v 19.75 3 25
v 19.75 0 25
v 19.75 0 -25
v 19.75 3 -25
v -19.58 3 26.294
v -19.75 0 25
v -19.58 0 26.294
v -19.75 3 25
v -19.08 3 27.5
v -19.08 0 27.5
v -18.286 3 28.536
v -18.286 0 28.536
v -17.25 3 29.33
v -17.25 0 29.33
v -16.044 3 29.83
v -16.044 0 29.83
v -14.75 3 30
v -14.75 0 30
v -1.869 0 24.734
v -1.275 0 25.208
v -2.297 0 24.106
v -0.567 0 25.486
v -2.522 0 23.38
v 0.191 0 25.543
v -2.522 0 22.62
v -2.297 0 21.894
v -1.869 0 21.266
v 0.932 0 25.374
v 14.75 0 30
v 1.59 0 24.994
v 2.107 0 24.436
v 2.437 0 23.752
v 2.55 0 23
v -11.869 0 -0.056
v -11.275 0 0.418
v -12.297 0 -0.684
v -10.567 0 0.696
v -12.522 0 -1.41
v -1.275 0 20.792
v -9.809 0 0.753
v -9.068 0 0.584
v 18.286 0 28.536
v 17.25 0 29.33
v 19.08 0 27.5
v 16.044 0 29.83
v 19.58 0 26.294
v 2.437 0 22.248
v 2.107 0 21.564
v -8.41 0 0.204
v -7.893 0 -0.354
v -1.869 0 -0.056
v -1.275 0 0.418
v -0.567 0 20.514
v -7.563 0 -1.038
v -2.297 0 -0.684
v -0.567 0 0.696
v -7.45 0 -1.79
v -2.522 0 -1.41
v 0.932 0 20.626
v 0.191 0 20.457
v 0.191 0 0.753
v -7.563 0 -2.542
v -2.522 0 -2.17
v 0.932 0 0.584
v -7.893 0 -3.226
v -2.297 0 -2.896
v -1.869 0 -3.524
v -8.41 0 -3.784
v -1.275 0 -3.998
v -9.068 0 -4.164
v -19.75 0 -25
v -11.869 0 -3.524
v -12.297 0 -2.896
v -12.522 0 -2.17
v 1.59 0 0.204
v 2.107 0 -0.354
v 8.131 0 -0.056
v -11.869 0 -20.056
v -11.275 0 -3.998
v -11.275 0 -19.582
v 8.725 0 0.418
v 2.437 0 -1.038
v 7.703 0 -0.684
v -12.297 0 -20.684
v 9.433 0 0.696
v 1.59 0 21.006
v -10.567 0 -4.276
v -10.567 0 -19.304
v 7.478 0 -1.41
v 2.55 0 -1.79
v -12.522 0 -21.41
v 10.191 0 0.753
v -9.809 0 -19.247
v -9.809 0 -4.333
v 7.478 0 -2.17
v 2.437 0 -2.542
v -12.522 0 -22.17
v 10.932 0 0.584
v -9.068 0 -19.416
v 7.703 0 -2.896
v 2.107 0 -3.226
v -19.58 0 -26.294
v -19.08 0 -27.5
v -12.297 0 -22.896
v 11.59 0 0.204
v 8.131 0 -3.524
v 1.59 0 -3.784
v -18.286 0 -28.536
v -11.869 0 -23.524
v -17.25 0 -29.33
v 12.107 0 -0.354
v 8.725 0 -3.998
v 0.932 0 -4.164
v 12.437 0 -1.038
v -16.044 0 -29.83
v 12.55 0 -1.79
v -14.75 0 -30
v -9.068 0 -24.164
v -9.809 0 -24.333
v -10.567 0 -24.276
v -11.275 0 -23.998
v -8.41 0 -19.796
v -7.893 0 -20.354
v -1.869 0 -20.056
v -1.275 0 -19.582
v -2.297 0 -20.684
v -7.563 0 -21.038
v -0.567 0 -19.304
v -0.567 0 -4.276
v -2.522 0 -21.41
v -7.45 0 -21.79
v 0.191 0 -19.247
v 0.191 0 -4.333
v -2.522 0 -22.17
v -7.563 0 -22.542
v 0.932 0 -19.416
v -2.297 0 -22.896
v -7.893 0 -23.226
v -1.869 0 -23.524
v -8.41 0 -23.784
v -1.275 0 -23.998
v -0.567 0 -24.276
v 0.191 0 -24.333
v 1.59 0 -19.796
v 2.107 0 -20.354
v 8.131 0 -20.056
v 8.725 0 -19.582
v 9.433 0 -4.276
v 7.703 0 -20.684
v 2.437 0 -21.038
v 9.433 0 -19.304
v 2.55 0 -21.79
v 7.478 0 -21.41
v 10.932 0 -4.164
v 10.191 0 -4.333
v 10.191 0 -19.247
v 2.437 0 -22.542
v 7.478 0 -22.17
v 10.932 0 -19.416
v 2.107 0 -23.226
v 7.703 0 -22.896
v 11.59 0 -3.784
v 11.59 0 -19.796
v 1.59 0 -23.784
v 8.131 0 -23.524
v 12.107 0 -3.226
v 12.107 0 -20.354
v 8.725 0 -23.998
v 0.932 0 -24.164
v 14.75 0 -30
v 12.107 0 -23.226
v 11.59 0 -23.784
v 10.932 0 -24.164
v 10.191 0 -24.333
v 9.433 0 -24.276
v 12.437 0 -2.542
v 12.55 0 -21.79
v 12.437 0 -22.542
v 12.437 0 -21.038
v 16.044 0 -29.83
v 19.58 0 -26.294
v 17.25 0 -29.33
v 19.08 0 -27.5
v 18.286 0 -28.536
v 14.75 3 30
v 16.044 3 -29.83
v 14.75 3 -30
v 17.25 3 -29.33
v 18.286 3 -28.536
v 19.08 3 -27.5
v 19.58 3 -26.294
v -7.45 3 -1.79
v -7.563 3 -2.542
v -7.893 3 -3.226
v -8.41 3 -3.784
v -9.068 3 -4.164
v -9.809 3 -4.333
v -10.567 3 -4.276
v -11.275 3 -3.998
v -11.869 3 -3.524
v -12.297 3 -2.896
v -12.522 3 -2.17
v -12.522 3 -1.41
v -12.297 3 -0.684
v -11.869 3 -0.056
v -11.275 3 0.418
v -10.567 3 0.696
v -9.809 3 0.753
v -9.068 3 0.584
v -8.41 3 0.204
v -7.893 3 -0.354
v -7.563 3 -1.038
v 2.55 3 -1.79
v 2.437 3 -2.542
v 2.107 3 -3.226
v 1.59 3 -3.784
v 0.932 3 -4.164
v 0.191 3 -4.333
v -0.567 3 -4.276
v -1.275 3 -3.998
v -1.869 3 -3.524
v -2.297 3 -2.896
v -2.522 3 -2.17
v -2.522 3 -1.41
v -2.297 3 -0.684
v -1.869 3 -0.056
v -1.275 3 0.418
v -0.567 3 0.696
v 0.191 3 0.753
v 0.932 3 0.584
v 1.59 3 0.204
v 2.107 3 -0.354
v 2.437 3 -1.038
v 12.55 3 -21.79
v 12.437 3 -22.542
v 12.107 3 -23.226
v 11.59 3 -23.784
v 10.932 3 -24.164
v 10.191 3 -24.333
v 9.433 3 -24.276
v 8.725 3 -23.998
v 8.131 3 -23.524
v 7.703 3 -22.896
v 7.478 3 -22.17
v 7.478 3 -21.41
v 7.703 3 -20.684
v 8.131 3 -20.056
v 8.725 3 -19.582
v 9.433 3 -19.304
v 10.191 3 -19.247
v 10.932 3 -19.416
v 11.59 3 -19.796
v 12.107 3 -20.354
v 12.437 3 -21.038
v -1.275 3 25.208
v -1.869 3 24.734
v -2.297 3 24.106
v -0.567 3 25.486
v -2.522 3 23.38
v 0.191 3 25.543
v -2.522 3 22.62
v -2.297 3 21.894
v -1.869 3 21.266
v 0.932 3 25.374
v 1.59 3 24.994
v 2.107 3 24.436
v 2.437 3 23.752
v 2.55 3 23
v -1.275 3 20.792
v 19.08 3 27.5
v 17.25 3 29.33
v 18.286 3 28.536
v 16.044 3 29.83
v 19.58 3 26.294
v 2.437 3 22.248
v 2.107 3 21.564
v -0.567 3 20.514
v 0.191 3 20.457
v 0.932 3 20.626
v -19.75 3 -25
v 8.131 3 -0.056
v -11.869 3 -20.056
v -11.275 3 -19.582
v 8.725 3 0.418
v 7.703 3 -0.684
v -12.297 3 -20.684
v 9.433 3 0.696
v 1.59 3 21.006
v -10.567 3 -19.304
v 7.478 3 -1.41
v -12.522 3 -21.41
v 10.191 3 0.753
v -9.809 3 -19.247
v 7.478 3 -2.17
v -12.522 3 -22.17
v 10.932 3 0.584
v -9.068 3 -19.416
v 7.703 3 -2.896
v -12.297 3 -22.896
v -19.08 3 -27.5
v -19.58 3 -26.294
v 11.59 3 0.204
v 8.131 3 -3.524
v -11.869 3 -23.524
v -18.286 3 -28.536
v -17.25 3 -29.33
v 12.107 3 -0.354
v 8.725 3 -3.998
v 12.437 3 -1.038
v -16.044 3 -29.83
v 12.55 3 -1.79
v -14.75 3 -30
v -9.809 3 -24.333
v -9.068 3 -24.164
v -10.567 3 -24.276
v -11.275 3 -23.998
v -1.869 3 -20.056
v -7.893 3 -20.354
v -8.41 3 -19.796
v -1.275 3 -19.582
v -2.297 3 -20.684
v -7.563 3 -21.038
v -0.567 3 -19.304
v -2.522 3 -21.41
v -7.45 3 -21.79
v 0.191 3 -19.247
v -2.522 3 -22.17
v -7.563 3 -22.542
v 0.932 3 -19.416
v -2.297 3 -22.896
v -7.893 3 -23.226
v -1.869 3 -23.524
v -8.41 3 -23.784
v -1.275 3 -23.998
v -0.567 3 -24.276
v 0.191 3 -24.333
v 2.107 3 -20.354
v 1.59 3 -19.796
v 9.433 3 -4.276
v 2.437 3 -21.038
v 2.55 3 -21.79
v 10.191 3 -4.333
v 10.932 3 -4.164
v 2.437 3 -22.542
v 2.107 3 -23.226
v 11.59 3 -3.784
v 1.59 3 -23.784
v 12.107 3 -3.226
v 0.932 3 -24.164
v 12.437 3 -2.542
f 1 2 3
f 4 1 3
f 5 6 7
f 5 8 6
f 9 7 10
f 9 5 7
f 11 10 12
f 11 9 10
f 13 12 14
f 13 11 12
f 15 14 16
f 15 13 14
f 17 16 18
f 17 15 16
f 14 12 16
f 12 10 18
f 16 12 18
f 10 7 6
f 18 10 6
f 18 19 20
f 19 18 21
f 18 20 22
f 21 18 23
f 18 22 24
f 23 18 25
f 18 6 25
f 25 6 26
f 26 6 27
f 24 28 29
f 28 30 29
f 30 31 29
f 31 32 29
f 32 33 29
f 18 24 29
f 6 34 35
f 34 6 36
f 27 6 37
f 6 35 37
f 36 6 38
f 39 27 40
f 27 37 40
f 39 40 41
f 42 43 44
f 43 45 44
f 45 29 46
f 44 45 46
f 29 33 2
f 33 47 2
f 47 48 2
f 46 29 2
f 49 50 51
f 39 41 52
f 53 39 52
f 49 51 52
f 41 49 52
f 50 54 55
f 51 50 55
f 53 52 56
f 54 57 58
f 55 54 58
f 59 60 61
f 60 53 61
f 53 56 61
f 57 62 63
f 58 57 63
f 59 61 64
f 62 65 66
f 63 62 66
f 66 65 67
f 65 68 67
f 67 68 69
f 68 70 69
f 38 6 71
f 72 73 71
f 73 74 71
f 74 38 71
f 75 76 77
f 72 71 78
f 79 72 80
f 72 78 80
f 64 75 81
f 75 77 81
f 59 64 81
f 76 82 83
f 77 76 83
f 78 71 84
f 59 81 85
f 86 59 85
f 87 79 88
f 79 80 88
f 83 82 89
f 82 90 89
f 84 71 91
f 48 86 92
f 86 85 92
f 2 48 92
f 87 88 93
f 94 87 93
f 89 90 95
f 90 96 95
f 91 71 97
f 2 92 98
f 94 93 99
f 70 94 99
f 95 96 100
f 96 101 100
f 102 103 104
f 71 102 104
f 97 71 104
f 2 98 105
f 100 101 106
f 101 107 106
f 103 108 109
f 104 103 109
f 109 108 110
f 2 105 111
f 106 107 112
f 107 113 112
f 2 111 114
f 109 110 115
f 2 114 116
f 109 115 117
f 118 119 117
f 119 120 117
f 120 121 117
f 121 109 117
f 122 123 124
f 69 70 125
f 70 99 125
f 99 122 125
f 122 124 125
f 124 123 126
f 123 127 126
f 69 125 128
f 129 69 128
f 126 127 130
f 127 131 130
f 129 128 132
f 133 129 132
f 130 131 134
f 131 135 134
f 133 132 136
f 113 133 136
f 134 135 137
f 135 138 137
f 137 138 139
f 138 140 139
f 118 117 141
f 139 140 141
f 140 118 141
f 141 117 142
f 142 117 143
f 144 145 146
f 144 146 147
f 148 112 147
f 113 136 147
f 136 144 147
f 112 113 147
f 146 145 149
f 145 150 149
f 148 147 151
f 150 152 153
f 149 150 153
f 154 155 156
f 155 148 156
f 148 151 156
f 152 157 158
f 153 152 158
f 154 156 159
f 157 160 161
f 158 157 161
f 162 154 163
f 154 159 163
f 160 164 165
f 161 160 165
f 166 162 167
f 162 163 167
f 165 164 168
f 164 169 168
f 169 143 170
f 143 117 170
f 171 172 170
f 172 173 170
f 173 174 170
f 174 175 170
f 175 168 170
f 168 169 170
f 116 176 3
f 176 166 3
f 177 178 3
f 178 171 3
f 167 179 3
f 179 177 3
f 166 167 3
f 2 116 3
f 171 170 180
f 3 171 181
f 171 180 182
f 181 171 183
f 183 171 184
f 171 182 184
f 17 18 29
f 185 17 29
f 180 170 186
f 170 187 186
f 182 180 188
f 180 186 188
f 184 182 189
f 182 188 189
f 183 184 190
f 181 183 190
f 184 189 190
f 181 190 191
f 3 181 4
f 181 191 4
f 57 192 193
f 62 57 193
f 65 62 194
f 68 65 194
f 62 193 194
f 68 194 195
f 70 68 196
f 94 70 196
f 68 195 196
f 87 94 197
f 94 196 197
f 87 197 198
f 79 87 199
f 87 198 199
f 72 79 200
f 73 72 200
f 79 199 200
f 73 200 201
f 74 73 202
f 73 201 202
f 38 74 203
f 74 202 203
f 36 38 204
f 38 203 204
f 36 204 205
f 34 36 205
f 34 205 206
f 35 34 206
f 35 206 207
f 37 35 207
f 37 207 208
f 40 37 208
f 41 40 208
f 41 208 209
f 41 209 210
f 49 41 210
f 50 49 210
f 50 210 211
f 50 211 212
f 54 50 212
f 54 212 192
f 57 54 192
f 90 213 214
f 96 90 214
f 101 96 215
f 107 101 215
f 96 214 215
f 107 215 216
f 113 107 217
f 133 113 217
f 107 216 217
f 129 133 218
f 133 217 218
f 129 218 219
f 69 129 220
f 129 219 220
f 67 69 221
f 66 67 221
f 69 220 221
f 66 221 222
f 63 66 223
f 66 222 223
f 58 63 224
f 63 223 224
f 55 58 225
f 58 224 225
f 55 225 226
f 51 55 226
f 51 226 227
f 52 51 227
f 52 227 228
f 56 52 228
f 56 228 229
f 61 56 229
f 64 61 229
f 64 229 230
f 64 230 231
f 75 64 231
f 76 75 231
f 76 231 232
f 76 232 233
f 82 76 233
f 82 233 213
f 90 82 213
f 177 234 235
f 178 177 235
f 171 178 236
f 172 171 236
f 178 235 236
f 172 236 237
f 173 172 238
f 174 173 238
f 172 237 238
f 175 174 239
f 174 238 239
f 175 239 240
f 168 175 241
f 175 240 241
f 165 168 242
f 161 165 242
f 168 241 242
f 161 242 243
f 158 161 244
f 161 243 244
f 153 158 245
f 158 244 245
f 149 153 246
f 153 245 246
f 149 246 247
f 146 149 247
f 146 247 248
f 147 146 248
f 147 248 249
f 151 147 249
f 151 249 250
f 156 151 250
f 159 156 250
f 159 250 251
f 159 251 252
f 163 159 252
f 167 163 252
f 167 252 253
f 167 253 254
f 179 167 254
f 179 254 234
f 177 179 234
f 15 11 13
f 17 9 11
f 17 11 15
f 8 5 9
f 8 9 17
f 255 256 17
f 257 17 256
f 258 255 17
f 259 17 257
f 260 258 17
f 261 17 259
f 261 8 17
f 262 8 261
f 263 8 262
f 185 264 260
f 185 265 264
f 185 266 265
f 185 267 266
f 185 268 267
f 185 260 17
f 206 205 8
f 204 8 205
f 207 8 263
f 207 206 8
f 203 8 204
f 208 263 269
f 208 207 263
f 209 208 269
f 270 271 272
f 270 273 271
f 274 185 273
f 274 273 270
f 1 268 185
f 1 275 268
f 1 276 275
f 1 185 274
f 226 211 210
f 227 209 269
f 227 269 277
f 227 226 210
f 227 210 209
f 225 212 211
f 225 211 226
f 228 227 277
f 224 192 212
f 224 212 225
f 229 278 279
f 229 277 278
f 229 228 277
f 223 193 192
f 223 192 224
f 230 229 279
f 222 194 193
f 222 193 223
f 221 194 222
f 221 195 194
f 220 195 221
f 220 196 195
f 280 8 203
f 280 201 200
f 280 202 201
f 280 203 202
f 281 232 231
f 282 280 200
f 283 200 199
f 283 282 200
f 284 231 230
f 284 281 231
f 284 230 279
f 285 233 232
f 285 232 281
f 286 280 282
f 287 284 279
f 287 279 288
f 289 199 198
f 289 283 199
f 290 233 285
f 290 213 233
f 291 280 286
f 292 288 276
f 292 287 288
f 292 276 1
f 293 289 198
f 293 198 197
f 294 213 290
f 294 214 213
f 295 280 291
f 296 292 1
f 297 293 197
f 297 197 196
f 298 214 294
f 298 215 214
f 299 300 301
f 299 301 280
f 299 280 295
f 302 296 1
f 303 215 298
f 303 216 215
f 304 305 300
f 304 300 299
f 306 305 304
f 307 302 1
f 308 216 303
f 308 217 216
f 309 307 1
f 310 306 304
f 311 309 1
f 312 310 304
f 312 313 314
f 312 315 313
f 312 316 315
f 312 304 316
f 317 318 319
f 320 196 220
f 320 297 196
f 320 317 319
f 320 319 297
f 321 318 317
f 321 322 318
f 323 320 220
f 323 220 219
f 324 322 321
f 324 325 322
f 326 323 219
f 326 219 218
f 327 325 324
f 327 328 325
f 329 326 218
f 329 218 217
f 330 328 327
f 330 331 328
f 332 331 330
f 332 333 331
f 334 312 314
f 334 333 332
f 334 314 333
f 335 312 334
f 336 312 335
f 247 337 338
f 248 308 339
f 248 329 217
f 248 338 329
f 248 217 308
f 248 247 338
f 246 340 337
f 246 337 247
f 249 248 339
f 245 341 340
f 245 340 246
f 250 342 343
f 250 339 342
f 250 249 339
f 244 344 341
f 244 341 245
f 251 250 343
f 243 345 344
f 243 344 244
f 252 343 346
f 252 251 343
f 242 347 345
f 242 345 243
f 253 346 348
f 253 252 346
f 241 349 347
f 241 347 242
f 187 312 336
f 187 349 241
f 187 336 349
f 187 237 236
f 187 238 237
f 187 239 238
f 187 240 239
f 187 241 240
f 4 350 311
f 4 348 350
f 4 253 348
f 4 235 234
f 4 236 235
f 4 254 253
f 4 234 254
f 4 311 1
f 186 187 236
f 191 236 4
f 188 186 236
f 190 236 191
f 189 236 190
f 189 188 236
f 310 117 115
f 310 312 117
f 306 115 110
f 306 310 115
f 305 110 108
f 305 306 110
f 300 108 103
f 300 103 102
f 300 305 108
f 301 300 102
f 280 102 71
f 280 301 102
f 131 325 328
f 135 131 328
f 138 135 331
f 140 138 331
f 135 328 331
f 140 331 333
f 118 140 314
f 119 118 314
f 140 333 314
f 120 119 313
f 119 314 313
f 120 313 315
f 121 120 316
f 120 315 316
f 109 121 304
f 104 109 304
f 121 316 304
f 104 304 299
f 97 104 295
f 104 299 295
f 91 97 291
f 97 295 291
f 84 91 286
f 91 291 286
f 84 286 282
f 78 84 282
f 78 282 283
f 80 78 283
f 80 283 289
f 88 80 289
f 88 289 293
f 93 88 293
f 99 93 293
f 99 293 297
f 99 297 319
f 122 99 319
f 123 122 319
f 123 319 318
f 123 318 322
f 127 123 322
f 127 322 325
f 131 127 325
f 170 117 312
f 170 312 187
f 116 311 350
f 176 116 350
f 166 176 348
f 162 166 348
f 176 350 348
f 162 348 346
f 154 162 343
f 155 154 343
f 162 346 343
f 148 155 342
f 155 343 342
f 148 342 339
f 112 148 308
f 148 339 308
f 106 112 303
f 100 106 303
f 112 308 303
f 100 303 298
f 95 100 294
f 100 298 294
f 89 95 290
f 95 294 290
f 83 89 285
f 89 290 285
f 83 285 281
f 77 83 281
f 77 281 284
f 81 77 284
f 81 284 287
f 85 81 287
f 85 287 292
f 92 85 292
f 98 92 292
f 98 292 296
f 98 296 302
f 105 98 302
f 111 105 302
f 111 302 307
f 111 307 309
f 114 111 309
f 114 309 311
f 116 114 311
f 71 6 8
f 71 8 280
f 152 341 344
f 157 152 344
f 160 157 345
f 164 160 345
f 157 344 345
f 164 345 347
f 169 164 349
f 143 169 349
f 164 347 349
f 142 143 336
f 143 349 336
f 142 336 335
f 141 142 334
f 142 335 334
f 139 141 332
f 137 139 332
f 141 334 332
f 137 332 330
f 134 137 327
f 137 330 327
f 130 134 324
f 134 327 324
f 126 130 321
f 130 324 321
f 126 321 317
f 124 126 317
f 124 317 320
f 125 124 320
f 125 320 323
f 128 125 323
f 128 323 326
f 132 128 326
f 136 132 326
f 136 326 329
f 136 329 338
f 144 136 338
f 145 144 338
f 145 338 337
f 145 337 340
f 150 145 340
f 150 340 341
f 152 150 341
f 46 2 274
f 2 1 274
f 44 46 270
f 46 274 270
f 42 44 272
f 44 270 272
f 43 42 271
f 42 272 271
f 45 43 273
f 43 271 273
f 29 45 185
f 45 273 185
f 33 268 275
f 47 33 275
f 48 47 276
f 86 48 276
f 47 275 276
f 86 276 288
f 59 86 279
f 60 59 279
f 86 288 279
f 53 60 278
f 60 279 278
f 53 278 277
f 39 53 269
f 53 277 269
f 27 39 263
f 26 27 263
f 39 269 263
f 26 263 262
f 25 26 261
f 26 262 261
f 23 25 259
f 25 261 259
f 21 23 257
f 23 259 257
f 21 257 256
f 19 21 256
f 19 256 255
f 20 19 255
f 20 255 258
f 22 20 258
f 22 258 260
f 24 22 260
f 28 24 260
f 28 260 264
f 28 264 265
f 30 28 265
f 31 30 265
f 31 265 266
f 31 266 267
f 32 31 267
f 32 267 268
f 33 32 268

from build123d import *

# Parameters (mm, degrees)
SKETCH1_W                 = 39.5
SKETCH1_H                 = 60
BOSS_EXTRUDE1_DEPTH       = 3
SKETCH2_R                 = 2.55
CUT_EXTRUDE1_DEPTH        = 4
SKETCH4_R                 = 2.55
CUT_EXTRUDE2_DEPTH        = 4
LPATTERN1_COUNT           = 2
LPATTERN1_PITCH           = 10
LPATTERN1_COL_COUNT       = 2
LPATTERN1_COL_PITCH       = 10
LPATTERN2_COUNT           = 2
LPATTERN2_PITCH           = 20
LPATTERN2_COPY_1_SKETCH_R = 2.55
LPATTERN2_COPY_1_DEPTH    = 4
LPATTERN2_COPY_2_SKETCH_R = 2.55
LPATTERN2_COPY_2_DEPTH    = 4
FILLET1_R                 = 5
FILLET2_R                 = 5
FILLET3_R                 = 5
FILLET4_R                 = 5


with BuildPart() as part:
    # Sketch1 → Boss-Extrude1 (new body)
    with BuildSketch(Plane(origin=(0, 0, 0), x_dir=(1, 0, 0), z_dir=(0, 1, 0))):
        Rectangle(SKETCH1_W, SKETCH1_H)
    extrude(amount=BOSS_EXTRUDE1_DEPTH)

    # Sketch2 → Cut-Extrude1 (cut, through all)
    with BuildSketch(Plane(origin=(0, 3, 0), x_dir=(1, 0, 0), z_dir=(0, 1, 0))):
        with Locations((0, 21.79)):
            Circle(SKETCH2_R)
    cut_extrude1 = extrude(amount=-CUT_EXTRUDE1_DEPTH, mode=Mode.SUBTRACT)

    # Sketch4 → Cut-Extrude2 (cut, through all)
    with BuildSketch(Plane(origin=(0, 3, 0), x_dir=(1, 0, 0), z_dir=(0, 1, 0))):
        with Locations((0, -23)):
            Circle(SKETCH4_R)
    extrude(amount=-CUT_EXTRUDE2_DEPTH, mode=Mode.SUBTRACT)

    # LPattern1: Cut-Extrude1 ×2
    with Locations(*[(-i * LPATTERN1_PITCH, 0, 0) for i in range(1, LPATTERN1_COUNT)]):
        add(cut_extrude1, mode=Mode.SUBTRACT)

    # LPattern1 col: Cut-Extrude1 ×2
    with Locations(*[(i * LPATTERN1_COL_PITCH, 0, 0) for i in range(1, LPATTERN1_COL_COUNT)]):
        add(cut_extrude1, mode=Mode.SUBTRACT)

    # LPattern2: Cut-Extrude1 ×2
    with Locations(*[(0, 0, i * LPATTERN2_PITCH) for i in range(1, LPATTERN2_COUNT)]):
        add(cut_extrude1, mode=Mode.SUBTRACT)

    # LPattern2 copy 1 sketch → LPattern2 copy 1 (cut, through all)
    with BuildSketch(Plane(origin=(-10, 3, 20), x_dir=(1, 0, 0), z_dir=(0, 1, 0))):
        with Locations((0, 21.79)):
            Circle(LPATTERN2_COPY_1_SKETCH_R)
    extrude(amount=-LPATTERN2_COPY_1_DEPTH, mode=Mode.SUBTRACT)

    # LPattern2 copy 2 sketch → LPattern2 copy 2 (cut, through all)
    with BuildSketch(Plane(origin=(10, 3, 20), x_dir=(1, 0, 0), z_dir=(0, 1, 0))):
        with Locations((0, 21.79)):
            Circle(LPATTERN2_COPY_2_SKETCH_R)
    extrude(amount=-LPATTERN2_COPY_2_DEPTH, mode=Mode.SUBTRACT)

    # Fillet1
    fillet1_edges = [part.edges().sort_by_distance(p)[0] for p in [
        (-19.75, 1.5, 30),
    ]]
    fillet(fillet1_edges, radius=FILLET1_R)

    # Fillet2
    fillet2_edges = [part.edges().sort_by_distance(p)[0] for p in [
        (19.75, 1.5, -30),
    ]]
    fillet(fillet2_edges, radius=FILLET2_R)

    # Fillet3
    fillet3_edges = [part.edges().sort_by_distance(p)[0] for p in [
        (19.75, 1.5, 30),
    ]]
    fillet(fillet3_edges, radius=FILLET3_R)

    # Fillet4
    fillet4_edges = [part.edges().sort_by_distance(p)[0] for p in [
        (-19.75, 1.5, -30),
    ]]
    fillet(fillet4_edges, radius=FILLET4_R)


solid = part.part
